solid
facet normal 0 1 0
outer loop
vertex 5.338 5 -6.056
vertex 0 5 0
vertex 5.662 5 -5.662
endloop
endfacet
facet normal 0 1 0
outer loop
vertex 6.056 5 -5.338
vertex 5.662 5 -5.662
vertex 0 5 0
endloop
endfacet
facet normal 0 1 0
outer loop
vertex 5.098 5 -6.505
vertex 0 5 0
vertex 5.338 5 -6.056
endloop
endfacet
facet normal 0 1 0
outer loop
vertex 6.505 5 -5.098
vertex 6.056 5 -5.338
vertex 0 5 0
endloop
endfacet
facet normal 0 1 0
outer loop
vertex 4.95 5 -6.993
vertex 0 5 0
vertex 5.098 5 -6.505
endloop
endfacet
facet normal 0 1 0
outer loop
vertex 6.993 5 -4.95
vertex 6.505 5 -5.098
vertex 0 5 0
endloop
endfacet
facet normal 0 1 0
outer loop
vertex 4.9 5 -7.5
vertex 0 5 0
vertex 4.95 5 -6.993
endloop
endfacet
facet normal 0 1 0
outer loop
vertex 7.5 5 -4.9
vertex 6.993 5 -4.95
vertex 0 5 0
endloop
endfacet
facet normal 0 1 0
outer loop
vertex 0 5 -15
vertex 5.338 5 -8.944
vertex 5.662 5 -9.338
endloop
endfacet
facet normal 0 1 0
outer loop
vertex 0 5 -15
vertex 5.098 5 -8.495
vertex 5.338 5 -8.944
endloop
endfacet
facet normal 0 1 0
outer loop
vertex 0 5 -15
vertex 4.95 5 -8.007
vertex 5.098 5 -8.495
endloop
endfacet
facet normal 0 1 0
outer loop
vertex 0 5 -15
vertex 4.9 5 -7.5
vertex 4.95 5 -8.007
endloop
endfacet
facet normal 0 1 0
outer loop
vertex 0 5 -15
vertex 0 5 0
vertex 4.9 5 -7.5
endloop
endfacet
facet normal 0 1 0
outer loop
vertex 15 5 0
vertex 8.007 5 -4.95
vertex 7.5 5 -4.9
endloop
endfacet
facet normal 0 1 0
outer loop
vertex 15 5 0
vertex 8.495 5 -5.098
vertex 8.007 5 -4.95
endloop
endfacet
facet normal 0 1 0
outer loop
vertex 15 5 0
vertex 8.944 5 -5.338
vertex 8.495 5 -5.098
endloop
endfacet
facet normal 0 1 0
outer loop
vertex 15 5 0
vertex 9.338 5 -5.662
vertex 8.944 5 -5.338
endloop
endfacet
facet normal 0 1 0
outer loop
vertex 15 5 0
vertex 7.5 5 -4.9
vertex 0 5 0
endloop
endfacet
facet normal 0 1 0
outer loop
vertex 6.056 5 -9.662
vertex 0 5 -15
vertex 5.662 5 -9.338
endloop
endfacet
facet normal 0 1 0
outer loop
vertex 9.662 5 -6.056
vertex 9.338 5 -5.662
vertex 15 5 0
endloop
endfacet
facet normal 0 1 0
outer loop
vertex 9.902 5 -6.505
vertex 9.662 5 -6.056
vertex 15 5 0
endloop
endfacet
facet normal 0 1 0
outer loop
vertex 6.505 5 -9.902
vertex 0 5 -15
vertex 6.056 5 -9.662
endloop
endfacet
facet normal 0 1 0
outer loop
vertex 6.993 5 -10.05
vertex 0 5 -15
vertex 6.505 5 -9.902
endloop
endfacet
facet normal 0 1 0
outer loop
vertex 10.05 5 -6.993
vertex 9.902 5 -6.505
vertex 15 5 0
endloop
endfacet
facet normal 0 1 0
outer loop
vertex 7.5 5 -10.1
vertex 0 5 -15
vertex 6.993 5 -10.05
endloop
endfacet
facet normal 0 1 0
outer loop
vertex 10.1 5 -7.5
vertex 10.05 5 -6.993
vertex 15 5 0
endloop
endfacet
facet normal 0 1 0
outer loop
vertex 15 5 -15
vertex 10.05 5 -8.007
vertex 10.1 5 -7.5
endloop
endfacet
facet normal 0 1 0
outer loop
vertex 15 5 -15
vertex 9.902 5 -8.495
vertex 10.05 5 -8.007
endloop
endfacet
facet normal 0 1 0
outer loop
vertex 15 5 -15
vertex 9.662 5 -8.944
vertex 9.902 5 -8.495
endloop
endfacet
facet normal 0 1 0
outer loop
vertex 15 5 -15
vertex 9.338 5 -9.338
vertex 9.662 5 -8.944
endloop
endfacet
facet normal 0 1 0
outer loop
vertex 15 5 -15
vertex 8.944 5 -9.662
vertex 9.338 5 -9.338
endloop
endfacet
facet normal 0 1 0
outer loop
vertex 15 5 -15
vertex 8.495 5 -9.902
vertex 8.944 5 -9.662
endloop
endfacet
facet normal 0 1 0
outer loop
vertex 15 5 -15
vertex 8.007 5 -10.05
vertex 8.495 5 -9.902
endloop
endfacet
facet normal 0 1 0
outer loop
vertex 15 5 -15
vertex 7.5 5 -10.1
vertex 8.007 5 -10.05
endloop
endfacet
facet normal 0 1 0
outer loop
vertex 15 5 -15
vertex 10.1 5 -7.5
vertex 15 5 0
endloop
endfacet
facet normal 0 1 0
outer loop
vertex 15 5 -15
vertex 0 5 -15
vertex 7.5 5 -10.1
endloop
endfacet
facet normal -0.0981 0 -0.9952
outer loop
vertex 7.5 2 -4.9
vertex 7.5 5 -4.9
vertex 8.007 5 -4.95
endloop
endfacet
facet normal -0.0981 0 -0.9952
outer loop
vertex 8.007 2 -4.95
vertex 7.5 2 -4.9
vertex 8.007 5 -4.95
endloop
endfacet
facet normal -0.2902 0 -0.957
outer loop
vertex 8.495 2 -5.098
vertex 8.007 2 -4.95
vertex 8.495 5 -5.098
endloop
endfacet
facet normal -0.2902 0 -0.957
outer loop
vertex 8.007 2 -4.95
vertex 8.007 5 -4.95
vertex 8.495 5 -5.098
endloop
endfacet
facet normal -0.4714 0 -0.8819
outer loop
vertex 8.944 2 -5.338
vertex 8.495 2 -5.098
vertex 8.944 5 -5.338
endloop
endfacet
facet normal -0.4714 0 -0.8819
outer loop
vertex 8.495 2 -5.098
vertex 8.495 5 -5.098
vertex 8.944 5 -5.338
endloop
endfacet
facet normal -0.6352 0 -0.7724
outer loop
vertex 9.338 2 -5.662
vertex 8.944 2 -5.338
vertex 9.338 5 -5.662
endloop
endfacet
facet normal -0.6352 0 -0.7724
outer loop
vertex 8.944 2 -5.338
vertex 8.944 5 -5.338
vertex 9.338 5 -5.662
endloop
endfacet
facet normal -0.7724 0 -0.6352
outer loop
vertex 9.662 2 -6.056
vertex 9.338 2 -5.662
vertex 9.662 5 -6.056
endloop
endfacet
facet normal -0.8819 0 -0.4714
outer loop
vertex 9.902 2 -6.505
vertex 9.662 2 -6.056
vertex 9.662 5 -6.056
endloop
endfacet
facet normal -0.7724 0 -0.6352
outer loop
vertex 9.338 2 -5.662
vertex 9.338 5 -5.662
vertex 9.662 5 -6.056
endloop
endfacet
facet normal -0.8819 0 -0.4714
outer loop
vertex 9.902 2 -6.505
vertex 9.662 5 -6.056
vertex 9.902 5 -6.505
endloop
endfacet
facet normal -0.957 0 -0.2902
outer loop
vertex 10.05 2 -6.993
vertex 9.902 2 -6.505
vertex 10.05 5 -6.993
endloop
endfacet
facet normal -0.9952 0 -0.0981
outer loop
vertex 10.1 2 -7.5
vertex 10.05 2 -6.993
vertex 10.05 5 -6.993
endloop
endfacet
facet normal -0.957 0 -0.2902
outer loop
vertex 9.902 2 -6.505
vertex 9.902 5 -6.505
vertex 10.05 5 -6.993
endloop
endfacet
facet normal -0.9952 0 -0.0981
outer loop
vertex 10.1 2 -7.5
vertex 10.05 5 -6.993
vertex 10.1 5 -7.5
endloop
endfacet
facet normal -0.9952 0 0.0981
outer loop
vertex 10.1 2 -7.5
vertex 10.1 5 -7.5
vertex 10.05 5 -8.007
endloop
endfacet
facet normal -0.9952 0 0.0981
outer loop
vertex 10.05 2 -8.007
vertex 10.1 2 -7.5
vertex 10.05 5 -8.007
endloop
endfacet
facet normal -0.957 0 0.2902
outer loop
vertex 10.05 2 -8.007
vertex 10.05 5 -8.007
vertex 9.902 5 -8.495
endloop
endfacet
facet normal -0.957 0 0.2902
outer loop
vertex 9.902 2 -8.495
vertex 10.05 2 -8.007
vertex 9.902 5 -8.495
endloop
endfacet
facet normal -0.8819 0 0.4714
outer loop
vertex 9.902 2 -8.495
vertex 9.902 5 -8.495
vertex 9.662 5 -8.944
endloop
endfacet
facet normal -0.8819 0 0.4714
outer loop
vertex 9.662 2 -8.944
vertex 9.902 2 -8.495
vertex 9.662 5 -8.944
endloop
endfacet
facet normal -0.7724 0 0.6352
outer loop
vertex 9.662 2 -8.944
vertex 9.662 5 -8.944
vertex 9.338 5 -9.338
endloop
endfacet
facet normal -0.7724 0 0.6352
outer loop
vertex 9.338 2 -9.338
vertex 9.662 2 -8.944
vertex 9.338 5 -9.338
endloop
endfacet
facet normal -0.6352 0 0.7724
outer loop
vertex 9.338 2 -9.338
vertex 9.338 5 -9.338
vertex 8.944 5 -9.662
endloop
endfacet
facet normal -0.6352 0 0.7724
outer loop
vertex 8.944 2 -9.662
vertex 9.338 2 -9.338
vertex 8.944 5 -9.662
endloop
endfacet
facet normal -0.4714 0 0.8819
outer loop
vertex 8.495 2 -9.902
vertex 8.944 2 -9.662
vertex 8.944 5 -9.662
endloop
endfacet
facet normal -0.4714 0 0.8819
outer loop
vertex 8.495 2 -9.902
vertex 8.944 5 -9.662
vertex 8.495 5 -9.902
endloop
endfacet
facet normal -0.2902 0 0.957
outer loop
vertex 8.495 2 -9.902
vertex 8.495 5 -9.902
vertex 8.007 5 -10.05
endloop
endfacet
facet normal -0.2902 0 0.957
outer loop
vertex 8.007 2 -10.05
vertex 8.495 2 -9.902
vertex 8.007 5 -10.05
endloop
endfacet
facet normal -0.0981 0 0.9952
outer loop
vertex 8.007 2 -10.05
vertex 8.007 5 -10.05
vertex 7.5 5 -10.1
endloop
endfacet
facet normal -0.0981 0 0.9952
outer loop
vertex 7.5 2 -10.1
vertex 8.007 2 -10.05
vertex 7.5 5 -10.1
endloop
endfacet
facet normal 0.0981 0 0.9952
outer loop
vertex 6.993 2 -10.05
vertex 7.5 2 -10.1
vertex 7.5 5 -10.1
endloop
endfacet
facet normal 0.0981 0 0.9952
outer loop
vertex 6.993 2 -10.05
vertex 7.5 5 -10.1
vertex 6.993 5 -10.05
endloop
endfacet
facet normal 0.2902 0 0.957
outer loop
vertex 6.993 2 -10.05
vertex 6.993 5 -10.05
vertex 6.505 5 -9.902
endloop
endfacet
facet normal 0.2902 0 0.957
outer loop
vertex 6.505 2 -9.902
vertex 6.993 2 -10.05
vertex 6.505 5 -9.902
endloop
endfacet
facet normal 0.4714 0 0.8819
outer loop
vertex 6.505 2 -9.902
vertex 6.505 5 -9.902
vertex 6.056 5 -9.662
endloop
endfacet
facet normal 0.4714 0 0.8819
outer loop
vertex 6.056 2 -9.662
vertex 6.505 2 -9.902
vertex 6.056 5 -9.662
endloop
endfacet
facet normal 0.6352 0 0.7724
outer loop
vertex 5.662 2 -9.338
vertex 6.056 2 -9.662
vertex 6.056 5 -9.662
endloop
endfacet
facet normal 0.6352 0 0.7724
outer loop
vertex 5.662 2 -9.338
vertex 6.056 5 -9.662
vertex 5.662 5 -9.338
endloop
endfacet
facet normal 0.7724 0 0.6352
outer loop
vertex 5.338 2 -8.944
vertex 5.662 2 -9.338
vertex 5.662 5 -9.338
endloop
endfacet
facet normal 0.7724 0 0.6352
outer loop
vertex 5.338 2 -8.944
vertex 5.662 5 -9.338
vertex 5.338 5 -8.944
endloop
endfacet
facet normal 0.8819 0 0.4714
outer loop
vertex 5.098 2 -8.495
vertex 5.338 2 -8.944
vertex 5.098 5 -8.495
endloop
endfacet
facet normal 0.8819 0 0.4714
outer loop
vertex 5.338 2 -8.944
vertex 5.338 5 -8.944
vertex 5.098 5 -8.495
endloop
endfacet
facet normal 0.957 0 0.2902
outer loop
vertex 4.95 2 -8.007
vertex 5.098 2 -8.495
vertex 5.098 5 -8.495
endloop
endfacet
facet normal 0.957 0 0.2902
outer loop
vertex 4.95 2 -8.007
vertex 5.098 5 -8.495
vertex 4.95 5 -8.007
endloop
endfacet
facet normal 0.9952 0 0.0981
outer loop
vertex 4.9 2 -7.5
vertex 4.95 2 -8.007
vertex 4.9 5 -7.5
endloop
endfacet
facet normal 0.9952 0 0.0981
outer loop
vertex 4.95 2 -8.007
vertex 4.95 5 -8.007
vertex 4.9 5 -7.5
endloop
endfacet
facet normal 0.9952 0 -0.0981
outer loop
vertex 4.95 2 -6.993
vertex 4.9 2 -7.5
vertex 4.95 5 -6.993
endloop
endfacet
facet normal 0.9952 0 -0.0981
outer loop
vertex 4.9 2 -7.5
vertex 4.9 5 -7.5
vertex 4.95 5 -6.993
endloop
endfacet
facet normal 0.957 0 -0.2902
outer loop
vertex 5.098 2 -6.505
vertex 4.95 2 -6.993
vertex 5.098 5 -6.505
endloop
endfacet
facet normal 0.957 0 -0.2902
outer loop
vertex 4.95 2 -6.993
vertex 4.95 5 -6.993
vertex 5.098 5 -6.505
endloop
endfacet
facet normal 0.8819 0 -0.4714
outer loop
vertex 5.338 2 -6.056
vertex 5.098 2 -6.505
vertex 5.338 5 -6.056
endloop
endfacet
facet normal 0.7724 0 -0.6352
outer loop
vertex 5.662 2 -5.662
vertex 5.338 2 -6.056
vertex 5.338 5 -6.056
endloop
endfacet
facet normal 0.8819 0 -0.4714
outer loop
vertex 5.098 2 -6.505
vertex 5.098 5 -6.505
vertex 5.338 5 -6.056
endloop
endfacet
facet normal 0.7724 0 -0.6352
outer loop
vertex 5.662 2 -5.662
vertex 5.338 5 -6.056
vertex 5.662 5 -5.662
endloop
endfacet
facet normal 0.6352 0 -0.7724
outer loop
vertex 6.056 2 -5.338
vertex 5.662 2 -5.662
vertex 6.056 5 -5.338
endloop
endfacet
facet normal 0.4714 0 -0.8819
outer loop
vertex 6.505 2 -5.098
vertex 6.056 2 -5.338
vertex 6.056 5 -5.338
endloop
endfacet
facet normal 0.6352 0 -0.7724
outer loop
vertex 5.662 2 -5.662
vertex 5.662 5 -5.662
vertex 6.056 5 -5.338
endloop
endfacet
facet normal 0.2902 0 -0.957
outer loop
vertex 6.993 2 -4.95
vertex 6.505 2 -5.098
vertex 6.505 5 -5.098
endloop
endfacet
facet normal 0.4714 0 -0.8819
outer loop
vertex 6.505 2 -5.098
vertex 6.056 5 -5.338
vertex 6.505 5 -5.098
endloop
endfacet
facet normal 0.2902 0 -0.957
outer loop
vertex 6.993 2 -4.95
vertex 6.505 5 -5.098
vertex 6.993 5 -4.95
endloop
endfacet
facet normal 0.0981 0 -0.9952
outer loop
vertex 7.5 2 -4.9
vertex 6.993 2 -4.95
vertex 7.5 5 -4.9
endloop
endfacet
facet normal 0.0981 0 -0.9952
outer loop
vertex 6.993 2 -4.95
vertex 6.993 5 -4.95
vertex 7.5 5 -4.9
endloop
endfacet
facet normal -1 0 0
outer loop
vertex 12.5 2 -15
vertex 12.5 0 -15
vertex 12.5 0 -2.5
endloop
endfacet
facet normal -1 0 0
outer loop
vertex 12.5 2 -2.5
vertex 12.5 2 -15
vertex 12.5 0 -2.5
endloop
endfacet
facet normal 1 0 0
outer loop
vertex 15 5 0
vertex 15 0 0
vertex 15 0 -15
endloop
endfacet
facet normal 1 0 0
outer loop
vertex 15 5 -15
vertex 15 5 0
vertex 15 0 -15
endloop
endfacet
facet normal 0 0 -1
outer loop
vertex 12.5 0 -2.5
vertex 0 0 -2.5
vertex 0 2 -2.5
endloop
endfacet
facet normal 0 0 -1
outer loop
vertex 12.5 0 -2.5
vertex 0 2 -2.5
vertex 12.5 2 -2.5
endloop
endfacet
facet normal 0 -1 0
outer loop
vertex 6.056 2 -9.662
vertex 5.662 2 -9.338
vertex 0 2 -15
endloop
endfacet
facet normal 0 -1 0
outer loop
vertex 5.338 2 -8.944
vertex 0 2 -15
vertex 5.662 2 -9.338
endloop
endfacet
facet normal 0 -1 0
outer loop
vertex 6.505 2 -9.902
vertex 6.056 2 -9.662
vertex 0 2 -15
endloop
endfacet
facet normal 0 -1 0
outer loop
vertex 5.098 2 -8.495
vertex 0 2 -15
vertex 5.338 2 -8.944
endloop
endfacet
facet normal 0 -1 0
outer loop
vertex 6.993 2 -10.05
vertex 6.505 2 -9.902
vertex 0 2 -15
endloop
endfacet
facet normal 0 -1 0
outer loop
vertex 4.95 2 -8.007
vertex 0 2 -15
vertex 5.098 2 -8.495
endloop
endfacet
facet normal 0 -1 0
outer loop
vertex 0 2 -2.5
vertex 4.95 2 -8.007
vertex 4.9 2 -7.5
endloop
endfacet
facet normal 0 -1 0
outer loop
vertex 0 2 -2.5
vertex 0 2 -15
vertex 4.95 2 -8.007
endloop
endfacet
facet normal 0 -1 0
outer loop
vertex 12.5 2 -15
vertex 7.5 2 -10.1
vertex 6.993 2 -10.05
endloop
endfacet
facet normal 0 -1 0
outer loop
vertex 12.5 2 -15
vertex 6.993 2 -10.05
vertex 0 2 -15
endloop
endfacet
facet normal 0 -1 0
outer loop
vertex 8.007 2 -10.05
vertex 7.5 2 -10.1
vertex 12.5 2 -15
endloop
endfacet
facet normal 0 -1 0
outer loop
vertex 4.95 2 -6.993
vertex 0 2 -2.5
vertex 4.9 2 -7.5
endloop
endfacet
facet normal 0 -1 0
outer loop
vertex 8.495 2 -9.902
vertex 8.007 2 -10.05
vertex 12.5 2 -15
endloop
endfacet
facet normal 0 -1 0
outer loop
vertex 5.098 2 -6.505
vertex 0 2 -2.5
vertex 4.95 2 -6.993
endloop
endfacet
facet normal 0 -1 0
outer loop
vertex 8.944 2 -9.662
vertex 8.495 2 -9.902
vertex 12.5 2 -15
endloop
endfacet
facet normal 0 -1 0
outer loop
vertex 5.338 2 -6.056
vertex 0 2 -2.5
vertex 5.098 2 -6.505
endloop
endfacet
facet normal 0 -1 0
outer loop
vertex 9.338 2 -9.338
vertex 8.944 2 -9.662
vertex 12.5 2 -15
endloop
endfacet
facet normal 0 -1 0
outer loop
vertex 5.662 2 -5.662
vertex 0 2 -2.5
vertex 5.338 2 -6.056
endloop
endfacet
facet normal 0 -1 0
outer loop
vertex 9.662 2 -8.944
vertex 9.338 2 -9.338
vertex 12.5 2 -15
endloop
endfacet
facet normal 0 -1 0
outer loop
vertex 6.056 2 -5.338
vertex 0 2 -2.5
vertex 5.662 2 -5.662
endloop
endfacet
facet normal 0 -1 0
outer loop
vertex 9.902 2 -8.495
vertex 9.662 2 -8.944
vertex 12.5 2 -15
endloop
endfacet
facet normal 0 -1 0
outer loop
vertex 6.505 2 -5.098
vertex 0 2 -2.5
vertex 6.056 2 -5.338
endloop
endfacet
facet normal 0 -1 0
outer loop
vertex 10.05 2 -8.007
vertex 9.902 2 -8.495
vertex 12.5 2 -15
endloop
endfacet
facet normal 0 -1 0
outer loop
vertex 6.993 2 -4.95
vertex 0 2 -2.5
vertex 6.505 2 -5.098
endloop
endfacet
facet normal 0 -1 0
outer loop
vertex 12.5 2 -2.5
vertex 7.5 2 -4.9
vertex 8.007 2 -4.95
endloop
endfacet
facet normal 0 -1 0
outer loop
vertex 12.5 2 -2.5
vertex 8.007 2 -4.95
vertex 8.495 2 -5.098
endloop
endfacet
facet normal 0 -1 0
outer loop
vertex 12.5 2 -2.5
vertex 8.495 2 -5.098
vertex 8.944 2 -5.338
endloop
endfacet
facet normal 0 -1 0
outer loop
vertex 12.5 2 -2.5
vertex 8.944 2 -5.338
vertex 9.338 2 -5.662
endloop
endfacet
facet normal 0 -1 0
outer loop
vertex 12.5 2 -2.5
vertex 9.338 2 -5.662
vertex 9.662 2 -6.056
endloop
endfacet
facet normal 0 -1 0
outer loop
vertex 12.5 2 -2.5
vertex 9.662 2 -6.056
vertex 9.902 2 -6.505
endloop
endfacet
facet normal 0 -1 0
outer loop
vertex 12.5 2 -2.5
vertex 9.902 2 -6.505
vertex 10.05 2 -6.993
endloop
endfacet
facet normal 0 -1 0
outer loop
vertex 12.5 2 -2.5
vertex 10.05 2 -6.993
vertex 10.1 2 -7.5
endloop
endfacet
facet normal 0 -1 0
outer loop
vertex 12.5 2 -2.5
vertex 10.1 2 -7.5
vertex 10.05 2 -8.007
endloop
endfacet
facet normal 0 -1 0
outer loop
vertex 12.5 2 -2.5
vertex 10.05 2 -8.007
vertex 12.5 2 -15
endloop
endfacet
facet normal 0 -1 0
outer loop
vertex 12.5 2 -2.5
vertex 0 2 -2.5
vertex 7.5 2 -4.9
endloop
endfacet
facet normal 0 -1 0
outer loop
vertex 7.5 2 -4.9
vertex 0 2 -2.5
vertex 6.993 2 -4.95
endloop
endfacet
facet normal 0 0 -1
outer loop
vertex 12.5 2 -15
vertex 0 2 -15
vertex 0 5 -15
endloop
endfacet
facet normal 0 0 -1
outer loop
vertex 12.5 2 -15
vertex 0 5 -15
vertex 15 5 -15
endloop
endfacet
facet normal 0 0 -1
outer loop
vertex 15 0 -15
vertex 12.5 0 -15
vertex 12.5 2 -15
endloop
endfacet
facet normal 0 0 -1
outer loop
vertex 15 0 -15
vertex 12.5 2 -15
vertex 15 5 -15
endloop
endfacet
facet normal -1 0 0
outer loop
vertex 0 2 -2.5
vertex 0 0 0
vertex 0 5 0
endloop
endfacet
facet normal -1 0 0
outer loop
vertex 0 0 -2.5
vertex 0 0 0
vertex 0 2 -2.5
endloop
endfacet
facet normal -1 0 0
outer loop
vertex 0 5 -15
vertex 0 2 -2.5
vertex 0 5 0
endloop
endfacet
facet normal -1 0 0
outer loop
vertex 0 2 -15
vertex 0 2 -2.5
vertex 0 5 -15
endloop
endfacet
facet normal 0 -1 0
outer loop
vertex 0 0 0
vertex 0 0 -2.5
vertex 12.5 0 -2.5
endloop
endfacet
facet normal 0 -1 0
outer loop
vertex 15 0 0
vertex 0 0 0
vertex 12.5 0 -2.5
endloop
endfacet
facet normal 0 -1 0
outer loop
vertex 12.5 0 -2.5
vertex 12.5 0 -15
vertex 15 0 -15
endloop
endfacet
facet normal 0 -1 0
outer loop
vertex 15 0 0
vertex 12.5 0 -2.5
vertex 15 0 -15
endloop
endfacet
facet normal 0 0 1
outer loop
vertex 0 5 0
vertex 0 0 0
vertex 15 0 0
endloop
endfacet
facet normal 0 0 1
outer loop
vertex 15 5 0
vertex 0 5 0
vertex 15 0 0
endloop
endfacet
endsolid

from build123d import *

# Parameters (mm, degrees)
CROQUIS1_W              = 15
CROQUIS1_H              = 15
SALIENTE_EXTRUIR1_DEPTH = 5
CROQUIS2_R              = 2.6
CORTAR_EXTRUIR1_DEPTH   = 5
CROQUIS3_W              = 12.5
CROQUIS3_H              = 12.5
CORTAR_EXTRUIR2_DEPTH   = 2


with BuildPart() as part:
    # Croquis1 → Saliente-Extruir1 (new body)
    with BuildSketch(Plane(origin=(0, 0, 0), x_dir=(1, 0, 0), z_dir=(0, 1, 0))):
        with Locations((7.5, 7.5)):
            Rectangle(CROQUIS1_W, CROQUIS1_H)
    extrude(amount=SALIENTE_EXTRUIR1_DEPTH)

    # Croquis2 → Cortar-Extruir1 (cut)
    with BuildSketch(Plane(origin=(0, 5, 0), x_dir=(1, 0, 0), z_dir=(0, 1, 0))):
        with Locations(Location((7.5, 7.5, 0), (0, 0, 270))):
            Circle(CROQUIS2_R)
    extrude(amount=-CORTAR_EXTRUIR1_DEPTH, mode=Mode.SUBTRACT)

    # Croquis3 → Cortar-Extruir2 (cut)
    with BuildSketch(Plane.XZ):
        with Locations((6.25, -8.75)):
            Rectangle(CROQUIS3_W, CROQUIS3_H)
    extrude(amount=-CORTAR_EXTRUIR2_DEPTH, mode=Mode.SUBTRACT)


solid = part.part
